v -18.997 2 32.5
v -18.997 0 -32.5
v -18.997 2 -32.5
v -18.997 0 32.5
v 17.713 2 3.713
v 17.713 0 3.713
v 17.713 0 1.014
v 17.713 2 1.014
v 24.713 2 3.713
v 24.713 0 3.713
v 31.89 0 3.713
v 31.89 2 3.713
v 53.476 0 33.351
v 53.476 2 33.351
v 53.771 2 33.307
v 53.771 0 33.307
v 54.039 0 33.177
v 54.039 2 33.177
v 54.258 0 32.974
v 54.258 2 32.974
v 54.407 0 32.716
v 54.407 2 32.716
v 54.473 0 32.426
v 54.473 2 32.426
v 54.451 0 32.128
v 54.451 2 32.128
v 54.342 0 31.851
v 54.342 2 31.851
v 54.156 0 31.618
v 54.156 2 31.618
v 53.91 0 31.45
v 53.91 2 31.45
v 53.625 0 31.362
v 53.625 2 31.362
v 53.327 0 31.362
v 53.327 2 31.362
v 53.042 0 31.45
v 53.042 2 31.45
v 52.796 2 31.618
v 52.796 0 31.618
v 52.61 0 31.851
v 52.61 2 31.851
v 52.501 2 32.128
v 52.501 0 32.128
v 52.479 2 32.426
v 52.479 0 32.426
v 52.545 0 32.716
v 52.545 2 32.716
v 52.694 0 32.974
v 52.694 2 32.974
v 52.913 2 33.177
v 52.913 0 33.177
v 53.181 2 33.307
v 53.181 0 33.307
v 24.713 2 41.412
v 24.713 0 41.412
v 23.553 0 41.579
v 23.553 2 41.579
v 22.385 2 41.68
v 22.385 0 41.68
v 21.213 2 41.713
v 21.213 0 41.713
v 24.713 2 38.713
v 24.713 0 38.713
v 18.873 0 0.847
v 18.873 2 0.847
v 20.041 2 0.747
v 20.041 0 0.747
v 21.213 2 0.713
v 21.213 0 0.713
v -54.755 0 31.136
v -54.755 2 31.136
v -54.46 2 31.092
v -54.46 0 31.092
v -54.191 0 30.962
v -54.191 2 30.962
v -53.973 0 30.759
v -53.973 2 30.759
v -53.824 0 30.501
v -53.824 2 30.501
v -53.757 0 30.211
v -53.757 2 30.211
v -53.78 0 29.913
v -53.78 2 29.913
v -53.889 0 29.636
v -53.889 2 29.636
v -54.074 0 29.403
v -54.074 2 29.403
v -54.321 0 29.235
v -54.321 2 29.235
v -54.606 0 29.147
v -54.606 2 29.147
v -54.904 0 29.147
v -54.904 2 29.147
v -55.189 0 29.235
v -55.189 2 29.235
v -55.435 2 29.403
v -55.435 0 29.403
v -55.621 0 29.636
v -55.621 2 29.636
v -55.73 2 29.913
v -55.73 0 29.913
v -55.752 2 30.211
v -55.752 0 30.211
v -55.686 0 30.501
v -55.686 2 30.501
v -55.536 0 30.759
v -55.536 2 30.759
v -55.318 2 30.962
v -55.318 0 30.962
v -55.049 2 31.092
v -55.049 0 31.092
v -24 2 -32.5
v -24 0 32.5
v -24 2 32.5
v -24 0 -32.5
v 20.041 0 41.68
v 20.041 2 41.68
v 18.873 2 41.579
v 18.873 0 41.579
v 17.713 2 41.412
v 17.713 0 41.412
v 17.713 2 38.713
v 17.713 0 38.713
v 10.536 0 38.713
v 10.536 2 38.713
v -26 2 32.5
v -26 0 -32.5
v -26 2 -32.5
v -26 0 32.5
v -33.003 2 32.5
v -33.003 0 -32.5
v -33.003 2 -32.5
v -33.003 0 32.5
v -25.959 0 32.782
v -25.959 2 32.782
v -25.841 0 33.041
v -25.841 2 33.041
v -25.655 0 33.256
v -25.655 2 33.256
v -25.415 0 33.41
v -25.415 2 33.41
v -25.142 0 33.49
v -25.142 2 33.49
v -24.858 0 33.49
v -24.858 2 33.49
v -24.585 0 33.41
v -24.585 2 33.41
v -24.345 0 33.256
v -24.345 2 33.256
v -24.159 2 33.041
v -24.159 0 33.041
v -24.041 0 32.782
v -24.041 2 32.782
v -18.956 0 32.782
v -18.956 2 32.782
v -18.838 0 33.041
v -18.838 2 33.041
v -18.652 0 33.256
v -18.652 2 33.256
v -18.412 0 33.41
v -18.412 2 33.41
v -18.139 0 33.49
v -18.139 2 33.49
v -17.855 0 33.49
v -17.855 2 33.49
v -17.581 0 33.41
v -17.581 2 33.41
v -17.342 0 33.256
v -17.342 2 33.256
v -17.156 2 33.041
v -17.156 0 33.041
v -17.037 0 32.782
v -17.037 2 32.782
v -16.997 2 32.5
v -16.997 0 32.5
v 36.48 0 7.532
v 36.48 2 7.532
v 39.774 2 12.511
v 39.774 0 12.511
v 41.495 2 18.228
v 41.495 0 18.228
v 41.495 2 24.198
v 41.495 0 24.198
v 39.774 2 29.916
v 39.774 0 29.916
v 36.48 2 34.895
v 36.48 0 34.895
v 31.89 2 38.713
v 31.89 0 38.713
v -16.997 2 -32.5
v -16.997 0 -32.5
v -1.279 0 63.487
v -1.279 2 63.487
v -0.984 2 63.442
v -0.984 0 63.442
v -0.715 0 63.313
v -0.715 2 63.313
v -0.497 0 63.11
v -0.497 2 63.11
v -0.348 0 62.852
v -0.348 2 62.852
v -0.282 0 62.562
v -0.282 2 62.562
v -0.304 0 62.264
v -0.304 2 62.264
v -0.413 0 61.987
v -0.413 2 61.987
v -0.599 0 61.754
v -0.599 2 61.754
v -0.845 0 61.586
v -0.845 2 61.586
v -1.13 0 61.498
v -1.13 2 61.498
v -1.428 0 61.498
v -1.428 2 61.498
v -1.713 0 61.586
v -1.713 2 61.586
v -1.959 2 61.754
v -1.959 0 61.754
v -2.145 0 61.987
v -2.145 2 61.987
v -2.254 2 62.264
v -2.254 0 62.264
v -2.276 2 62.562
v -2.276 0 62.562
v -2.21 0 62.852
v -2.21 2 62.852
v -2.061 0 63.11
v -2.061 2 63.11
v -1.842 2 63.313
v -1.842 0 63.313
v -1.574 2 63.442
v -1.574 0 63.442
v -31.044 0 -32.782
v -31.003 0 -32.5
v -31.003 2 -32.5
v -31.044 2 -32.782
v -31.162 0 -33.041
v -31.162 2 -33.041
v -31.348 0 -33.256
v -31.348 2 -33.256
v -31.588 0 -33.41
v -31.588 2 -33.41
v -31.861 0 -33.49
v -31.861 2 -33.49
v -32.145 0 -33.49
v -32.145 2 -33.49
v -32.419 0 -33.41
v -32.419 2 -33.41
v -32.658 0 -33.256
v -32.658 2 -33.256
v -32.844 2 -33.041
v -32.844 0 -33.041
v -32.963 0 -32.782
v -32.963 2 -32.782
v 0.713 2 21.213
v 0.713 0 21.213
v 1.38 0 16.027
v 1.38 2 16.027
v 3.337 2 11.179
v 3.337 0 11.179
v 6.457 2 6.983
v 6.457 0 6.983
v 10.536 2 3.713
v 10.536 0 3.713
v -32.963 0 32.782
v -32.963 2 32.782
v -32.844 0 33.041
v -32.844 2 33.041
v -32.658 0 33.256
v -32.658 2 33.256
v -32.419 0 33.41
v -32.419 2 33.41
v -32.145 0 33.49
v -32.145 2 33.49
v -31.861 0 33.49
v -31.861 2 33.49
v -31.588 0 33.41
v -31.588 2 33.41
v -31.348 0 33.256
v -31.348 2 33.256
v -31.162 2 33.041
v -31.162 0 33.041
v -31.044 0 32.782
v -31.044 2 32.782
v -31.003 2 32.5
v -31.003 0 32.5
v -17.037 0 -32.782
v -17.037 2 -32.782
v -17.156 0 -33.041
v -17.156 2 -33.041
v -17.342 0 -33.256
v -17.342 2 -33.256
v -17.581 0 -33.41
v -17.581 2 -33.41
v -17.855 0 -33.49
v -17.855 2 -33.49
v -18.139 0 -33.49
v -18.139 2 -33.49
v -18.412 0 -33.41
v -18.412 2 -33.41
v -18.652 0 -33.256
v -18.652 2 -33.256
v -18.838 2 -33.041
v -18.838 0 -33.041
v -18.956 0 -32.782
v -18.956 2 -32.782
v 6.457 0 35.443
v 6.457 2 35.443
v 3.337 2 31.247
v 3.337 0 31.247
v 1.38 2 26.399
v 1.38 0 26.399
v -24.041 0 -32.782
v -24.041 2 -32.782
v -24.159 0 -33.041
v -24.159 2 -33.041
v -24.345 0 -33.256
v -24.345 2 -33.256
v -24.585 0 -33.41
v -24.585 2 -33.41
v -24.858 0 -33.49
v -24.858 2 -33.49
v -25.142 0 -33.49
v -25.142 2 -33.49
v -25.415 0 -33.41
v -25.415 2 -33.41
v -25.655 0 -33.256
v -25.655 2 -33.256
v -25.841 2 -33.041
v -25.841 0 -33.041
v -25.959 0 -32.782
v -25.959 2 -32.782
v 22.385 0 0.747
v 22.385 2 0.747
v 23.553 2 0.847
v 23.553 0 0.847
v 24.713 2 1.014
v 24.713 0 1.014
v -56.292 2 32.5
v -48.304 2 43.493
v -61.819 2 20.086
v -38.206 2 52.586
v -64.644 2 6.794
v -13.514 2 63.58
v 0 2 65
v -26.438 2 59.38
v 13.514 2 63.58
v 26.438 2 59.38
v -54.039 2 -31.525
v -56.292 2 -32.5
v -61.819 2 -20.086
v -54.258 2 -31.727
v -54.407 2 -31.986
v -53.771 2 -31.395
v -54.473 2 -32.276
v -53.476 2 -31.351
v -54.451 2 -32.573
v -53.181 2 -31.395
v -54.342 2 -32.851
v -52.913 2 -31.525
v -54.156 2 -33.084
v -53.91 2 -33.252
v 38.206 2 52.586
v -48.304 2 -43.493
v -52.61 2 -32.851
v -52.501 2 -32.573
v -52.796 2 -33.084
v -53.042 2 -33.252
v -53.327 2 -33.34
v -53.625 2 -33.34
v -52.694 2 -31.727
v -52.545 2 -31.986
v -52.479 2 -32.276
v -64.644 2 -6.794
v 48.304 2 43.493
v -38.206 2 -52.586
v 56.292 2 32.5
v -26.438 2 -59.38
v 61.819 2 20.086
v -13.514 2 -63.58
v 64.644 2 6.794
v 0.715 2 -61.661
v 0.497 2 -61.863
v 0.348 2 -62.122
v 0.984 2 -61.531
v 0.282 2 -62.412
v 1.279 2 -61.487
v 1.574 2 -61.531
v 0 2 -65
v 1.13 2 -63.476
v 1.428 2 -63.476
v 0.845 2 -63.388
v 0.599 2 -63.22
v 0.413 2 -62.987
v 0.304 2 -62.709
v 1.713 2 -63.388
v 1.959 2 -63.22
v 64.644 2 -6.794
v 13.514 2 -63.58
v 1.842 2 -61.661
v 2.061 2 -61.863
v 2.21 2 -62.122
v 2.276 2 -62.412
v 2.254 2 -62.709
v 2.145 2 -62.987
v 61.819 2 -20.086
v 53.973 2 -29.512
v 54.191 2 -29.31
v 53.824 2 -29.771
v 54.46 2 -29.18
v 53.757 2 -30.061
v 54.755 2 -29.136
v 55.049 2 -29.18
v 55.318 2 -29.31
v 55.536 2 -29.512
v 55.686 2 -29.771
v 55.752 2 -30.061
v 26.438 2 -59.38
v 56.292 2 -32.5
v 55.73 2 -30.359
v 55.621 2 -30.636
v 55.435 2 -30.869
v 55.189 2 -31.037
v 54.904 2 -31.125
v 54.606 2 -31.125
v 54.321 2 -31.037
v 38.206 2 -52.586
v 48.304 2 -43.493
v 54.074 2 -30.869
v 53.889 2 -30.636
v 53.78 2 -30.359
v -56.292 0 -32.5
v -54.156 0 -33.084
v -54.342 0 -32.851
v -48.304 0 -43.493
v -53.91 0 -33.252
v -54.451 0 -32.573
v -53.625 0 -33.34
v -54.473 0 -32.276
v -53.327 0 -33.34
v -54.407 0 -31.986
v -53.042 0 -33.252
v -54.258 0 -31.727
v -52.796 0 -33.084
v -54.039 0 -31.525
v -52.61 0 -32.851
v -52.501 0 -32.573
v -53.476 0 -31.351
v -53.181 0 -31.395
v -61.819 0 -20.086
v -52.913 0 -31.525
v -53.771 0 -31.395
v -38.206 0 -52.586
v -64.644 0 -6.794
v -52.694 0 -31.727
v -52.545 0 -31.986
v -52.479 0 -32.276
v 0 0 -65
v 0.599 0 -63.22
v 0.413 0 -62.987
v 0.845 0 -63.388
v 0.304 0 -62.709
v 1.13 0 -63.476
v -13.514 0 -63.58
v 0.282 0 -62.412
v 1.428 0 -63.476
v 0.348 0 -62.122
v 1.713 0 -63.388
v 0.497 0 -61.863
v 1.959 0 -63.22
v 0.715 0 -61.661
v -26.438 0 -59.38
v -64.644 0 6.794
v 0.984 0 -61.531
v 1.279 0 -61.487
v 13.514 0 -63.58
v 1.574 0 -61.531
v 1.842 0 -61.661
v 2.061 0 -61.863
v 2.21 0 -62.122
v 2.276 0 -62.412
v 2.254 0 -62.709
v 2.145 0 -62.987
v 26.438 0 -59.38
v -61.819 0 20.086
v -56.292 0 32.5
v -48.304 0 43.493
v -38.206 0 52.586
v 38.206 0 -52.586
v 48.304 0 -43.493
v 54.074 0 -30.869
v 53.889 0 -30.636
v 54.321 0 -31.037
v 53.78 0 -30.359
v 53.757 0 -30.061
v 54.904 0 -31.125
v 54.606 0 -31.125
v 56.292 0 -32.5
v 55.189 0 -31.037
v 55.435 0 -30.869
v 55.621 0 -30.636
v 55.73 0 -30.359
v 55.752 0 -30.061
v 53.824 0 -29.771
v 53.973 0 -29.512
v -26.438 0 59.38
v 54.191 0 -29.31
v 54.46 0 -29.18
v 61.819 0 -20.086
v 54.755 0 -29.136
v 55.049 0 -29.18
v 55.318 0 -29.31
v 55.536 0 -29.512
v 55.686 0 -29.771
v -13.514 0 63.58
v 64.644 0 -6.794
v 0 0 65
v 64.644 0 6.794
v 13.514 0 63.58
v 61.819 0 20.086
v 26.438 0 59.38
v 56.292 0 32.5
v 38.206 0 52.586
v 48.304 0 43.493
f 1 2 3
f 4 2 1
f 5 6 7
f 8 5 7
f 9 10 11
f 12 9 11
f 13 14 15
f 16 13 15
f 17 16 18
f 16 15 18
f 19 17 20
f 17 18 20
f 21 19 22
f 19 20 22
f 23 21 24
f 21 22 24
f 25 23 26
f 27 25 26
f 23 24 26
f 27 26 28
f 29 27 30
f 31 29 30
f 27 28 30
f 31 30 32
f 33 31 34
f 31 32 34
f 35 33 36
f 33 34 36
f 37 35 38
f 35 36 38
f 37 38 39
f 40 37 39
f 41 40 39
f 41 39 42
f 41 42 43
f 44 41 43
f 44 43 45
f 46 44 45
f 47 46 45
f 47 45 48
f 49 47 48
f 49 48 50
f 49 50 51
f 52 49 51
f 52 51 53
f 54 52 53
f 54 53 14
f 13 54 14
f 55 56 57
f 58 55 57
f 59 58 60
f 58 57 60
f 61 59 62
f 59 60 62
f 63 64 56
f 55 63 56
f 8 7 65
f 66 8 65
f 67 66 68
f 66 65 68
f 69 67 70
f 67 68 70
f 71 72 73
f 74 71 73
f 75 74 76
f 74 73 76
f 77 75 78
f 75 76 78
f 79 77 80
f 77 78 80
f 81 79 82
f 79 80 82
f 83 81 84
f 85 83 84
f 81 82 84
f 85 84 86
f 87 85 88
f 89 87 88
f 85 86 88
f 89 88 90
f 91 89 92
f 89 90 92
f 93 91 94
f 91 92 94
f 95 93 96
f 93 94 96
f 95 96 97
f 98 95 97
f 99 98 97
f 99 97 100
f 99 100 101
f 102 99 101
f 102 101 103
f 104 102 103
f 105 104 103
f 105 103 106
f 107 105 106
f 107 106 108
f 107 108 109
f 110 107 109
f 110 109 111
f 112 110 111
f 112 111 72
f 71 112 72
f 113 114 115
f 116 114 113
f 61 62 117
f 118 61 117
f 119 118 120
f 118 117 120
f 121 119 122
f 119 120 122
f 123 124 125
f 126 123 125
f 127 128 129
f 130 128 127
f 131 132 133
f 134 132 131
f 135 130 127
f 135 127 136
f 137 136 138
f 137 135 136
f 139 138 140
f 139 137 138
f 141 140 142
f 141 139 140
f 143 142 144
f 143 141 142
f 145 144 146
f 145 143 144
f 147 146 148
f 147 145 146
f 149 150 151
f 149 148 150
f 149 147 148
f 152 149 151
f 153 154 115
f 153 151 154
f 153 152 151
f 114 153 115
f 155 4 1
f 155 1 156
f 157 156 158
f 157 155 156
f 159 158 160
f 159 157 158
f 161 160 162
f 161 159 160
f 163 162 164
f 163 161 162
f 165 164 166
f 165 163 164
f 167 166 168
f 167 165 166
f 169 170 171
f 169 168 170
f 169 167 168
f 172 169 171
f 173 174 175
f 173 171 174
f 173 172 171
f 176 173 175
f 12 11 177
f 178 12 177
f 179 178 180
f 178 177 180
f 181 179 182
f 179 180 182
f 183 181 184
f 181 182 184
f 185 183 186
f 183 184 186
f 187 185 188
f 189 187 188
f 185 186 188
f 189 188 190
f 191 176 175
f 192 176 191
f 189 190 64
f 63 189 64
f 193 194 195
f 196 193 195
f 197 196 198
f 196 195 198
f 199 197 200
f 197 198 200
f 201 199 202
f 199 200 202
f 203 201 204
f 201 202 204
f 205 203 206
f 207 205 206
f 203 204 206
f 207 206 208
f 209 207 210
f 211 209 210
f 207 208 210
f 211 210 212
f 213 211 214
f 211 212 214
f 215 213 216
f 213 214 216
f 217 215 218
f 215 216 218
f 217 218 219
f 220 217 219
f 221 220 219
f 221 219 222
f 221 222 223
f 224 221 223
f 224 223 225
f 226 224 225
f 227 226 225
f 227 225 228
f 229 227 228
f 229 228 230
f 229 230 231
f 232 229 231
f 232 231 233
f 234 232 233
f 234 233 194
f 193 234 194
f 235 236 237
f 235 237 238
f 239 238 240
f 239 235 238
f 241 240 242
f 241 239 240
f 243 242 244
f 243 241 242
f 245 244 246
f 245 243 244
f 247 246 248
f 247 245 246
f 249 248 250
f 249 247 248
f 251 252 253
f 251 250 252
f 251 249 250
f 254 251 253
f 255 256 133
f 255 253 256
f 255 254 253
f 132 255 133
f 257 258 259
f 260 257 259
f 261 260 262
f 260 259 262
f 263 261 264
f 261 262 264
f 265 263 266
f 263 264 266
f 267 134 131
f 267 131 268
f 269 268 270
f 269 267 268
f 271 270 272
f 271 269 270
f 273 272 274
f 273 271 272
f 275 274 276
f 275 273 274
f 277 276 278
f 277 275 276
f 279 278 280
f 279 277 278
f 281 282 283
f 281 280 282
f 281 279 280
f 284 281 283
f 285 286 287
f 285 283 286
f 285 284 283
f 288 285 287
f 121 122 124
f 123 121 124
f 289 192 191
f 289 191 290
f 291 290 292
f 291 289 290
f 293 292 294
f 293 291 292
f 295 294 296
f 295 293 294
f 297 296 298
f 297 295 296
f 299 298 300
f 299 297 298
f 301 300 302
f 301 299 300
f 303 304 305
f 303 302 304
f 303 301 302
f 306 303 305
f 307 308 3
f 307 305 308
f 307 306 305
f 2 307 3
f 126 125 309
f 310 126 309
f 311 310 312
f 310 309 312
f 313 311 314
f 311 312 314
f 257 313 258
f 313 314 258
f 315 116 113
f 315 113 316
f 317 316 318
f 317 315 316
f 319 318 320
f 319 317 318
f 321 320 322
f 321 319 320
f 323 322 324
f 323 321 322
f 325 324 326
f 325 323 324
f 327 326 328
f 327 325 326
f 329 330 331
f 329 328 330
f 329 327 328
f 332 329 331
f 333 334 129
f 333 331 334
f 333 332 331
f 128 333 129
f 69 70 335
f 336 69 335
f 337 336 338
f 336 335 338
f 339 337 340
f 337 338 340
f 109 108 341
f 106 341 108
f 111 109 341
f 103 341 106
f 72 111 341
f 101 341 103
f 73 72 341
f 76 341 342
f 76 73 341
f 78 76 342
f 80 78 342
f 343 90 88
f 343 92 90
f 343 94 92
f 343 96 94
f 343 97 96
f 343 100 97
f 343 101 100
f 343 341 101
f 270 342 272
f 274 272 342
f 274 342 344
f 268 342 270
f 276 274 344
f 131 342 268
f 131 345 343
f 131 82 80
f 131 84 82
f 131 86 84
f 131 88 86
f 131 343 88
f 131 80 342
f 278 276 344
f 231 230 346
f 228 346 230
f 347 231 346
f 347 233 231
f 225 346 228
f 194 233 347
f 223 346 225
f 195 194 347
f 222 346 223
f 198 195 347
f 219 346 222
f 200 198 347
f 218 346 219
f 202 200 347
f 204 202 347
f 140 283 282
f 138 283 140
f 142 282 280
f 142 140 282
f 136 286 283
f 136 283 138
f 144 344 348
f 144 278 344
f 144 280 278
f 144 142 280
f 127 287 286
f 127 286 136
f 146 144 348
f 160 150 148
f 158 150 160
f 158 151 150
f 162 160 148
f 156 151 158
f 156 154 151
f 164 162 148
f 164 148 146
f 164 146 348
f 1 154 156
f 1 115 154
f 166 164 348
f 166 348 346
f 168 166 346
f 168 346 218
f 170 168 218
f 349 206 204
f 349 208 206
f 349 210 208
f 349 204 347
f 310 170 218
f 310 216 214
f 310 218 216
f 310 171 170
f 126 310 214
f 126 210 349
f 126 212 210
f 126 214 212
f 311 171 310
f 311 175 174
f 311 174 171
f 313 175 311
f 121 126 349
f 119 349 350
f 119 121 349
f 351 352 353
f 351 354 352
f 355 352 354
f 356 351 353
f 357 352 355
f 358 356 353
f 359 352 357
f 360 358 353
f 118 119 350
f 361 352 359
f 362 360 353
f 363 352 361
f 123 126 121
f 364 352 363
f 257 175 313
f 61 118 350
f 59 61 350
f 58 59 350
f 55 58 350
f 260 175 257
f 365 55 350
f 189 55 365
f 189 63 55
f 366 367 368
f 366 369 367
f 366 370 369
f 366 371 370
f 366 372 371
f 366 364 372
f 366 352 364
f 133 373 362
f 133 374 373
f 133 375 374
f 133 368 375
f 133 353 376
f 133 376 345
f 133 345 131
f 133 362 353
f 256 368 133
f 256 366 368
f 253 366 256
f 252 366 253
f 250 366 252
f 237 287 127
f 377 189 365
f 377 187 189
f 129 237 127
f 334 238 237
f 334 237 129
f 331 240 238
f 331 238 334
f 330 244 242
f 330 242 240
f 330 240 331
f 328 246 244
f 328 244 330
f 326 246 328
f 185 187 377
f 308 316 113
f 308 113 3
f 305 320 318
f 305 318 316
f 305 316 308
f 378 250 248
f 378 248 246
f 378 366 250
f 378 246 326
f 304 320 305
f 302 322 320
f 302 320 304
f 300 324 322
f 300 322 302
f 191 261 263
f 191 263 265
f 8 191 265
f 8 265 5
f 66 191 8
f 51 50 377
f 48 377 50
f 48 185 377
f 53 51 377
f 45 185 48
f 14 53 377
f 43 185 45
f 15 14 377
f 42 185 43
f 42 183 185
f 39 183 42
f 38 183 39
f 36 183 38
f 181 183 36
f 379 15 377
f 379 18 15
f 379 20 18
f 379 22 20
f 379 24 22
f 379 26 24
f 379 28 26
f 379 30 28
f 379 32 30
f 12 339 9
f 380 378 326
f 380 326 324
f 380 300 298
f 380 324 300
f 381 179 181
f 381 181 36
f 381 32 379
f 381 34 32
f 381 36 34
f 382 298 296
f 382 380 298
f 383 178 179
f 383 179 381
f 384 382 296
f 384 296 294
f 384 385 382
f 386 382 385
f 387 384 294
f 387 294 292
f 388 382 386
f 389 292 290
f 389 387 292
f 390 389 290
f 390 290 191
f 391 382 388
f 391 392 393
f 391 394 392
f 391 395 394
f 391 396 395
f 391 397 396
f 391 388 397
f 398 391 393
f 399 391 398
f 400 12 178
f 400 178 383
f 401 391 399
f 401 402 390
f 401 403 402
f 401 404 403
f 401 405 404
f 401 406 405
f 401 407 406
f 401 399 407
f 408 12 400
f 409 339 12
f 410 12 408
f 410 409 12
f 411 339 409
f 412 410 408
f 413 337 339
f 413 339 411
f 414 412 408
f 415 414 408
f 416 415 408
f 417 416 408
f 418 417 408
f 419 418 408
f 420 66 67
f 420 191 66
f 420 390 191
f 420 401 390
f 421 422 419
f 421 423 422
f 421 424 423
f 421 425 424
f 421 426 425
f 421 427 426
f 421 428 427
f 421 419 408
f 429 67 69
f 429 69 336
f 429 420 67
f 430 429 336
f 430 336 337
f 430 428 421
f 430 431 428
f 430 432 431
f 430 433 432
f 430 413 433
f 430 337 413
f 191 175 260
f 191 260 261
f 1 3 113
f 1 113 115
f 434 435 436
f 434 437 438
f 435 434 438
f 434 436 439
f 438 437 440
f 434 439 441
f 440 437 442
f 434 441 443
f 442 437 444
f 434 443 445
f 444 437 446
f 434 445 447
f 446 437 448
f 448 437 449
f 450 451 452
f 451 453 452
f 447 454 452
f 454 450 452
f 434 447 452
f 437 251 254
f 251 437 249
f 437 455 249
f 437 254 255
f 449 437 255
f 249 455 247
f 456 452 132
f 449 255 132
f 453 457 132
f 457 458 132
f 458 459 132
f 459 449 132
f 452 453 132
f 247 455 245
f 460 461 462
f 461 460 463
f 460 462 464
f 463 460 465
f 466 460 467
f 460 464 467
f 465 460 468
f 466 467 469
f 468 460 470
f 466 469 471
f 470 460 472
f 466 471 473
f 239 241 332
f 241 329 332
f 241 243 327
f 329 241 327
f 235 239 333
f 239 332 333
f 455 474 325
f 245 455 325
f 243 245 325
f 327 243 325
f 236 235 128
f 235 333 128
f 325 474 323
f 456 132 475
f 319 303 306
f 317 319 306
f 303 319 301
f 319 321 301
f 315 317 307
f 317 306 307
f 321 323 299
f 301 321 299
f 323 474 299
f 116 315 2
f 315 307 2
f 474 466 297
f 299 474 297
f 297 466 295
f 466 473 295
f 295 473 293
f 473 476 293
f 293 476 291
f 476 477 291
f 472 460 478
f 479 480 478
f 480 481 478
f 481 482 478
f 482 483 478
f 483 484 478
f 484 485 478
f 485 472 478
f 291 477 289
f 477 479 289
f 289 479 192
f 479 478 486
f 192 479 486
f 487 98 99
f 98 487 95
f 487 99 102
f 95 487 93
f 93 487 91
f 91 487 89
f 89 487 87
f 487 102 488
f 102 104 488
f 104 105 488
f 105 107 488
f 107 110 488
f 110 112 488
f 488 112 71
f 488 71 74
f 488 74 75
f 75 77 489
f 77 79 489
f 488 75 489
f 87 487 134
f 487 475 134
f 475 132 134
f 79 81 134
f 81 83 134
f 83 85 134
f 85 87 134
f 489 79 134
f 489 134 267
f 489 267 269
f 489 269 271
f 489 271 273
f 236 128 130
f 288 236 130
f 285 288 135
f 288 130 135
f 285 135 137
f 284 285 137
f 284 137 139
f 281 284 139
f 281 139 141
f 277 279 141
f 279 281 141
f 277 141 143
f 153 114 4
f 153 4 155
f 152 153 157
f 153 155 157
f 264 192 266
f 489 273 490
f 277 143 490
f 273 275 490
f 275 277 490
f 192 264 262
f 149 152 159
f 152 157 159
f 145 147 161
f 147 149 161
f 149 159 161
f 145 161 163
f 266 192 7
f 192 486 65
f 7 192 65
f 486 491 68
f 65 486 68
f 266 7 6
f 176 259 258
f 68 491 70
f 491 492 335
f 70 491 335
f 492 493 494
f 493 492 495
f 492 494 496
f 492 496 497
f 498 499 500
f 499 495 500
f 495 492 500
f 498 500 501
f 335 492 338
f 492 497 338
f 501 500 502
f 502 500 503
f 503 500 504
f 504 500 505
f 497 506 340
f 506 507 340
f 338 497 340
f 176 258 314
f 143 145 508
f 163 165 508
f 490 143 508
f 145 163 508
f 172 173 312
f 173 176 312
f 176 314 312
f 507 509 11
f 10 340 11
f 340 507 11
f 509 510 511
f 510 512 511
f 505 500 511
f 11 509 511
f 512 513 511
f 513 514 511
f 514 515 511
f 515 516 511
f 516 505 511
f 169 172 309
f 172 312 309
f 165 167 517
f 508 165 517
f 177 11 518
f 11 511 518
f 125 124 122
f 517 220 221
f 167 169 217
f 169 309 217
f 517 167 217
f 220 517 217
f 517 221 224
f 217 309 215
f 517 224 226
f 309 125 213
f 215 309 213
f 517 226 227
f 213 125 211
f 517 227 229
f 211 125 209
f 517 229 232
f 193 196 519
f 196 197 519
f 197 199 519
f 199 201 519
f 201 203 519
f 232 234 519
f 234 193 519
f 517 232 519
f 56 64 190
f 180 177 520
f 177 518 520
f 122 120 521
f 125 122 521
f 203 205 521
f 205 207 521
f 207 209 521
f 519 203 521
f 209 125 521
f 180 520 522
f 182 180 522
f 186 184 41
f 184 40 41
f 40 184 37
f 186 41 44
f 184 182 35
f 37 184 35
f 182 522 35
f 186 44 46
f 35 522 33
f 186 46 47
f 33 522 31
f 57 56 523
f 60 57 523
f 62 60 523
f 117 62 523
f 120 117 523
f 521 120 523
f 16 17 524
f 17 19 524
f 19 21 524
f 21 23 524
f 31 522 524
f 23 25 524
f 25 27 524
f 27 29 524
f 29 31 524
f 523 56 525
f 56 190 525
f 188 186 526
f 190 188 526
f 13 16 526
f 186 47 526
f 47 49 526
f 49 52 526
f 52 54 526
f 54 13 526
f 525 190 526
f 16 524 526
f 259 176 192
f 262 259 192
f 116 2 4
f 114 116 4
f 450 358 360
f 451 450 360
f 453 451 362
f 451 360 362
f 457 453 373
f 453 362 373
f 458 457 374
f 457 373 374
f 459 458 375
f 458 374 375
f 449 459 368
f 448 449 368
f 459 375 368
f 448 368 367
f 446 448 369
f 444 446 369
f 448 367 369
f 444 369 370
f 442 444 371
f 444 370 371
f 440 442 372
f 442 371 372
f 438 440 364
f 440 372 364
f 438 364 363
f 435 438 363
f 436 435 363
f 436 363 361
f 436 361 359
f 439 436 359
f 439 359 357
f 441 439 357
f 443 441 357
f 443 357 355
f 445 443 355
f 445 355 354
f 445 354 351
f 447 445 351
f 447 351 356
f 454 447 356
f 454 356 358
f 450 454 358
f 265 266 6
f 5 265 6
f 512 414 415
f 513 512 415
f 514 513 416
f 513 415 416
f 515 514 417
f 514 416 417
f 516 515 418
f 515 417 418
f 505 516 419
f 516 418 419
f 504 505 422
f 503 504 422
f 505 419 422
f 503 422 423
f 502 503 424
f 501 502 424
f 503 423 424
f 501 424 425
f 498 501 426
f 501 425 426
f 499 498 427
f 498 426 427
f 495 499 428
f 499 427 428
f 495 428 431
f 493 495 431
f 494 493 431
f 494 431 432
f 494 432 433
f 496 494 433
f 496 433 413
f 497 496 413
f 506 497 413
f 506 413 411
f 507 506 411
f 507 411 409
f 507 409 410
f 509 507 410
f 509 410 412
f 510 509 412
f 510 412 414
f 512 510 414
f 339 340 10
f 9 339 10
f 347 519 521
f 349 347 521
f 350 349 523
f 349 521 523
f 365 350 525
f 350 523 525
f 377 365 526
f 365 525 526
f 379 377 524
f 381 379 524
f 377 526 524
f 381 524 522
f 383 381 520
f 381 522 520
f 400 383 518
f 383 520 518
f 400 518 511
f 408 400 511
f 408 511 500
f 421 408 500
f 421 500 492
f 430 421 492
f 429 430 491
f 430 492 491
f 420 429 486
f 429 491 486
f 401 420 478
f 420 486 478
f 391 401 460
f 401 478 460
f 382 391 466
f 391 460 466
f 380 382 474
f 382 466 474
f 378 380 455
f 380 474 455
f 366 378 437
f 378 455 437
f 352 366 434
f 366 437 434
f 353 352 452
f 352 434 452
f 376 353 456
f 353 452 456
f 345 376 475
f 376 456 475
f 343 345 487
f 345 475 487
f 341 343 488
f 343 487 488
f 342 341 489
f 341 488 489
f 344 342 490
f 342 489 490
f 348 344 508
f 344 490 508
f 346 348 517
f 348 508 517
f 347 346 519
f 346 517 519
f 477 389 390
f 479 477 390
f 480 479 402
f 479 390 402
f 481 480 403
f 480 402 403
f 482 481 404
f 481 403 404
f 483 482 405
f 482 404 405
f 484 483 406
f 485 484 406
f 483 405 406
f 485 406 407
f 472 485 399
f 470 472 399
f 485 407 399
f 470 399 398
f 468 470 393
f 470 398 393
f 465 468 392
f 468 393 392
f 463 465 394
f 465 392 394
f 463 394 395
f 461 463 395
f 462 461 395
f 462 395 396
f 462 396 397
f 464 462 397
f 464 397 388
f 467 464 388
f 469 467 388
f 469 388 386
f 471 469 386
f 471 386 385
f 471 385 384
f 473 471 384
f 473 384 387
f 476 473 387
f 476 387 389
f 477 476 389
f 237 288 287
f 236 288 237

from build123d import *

# Parameters (mm, degrees)
ESQUISSE1_R              = 65
BOSS_EXTRU_1_DEPTH       = 2
ESQUISSE2_R              = 1
ENL_V_MAT_EXTRU_1_DEPTH  = 3
ESQUISSE3_R              = 7.5
ENL_V_MAT_EXTRU_2_DEPTH  = 3
ESQUISSE4_R              = 2
ENL_V_MAT_EXTRU_4_DEPTH  = 4
ESQUISSE5_R              = 7.5
BOSS_EXTRU_3_DEPTH       = 4
ESQUISSE6_R              = 2
BOSS_EXTRU_5_DEPTH       = 2
ENL_V_START              = -2
ESQUISSE11_R             = 7.5
ENL_V_MAT_EXTRU_7_DEPTH  = 2
ENL_V_MAT_EXTRU_10_DEPTH = 92.945636112
ENL_V_MAT_EXTRU_11_DEPTH = 10


with BuildPart() as part:
    # Esquisse1 → Boss.-Extru.1 (new body)
    with BuildSketch(Plane(origin=(0, 0, 0), x_dir=(1, 0, 0), z_dir=(0, 1, 0))):
        with Locations(Location((0, 0, 0), (0, 0, 270))):
            Circle(ESQUISSE1_R)
    extrude(amount=BOSS_EXTRU_1_DEPTH)

    # Esquisse2 → Enlèv. mat.-Extru.1 (cut)
    with BuildSketch(Plane(origin=(0, 2, 0), x_dir=(1, 0, 0), z_dir=(0, 1, 0))):
        with Locations(Location((-53.47585562, 32.350932996, 0), (0, 0, 270))):
            Circle(ESQUISSE2_R)
        with Locations(Location((-54.754657621, -30.135982958, 0), (0, 0, 270))):
            Circle(ESQUISSE2_R)
        with Locations(Location((-1.278802001, -62.486915954, 0), (0, 0, 270))):
            Circle(ESQUISSE2_R)
        with Locations(Location((53.47585562, -32.350932996, 0), (0, 0, 270))):
            Circle(ESQUISSE2_R)
        with Locations(Location((54.754657621, 30.135982958, 0), (0, 0, 270))):
            Circle(ESQUISSE2_R)
        with Locations(Location((1.278802001, 62.486915954, 0), (0, 0, 270))):
            Circle(ESQUISSE2_R)
    extrude(amount=-ENL_V_MAT_EXTRU_1_DEPTH, mode=Mode.SUBTRACT)

    # Esquisse3 → Enlèv. mat.-Extru.2 (cut)
    with BuildSketch(Plane(origin=(0, 2, 0), x_dir=(1, 0, 0), z_dir=(0, 1, 0))):
        with Locations(Location((0, 0, 0), (0, 0, 270))):
            Circle(ESQUISSE3_R)
    extrude(amount=-ENL_V_MAT_EXTRU_2_DEPTH, mode=Mode.SUBTRACT)

    # Esquisse4 → Enlèv. mat.-Extru.4 (cut)
    with BuildSketch(Plane(origin=(0, 2, 0), x_dir=(1, 0, 0), z_dir=(0, 1, 0))):
        with Locations(Location((0, 33.5, 0), (0, 0, 270))):
            Circle(ESQUISSE4_R)
        with Locations(Location((29.011851027, 16.75, 0), (0, 0, 270))):
            Circle(ESQUISSE4_R)
        with Locations(Location((29.011851027, -16.75, 0), (0, 0, 270))):
            Circle(ESQUISSE4_R)
        with Locations(Location((0, -33.5, 0), (0, 0, 270))):
            Circle(ESQUISSE4_R)
        with Locations(Location((-29.011851027, -16.75, 0), (0, 0, 270))):
            Circle(ESQUISSE4_R)
        with Locations(Location((-29.011851027, 16.75, 0), (0, 0, 270))):
            Circle(ESQUISSE4_R)
    extrude(amount=-ENL_V_MAT_EXTRU_4_DEPTH, mode=Mode.SUBTRACT)

    # Esquisse5 → Boss.-Extru.3 (add)
    with BuildSketch(Plane(origin=(0, 2, 0), x_dir=(1, 0, 0), z_dir=(0, 1, 0))):
        with Locations(Location((0, 0, 0), (0, 0, 270))):
            Circle(ESQUISSE5_R)
    extrude(amount=-BOSS_EXTRU_3_DEPTH)

    # Esquisse6 → Boss.-Extru.5 (add)
    with BuildSketch(Plane(origin=(0, 2, 0), x_dir=(1, 0, 0), z_dir=(0, 1, 0))):
        with Locations((-29.011851027, 16.75)):
            Circle(ESQUISSE6_R)
        with Locations((29.011851027, 16.75)):
            Circle(ESQUISSE6_R)
        with Locations((29.011851027, -16.75)):
            Circle(ESQUISSE6_R)
        with Locations((0, -33.5)):
            Circle(ESQUISSE6_R)
        with Locations((-29.011851027, -16.75)):
            Circle(ESQUISSE6_R)
        with Locations((0, 33.5)):
            Circle(ESQUISSE6_R)
    extrude(amount=-BOSS_EXTRU_5_DEPTH)

    # Esquisse11 → Enlèv. mat.-Extru.7 (cut)
    with BuildSketch(Plane(origin=(0, -2, 0), x_dir=(-1, 0, 0), z_dir=(0, -1, 0)).offset(ENL_V_START)):
        Circle(ESQUISSE11_R)
    extrude(amount=ENL_V_MAT_EXTRU_7_DEPTH, mode=Mode.SUBTRACT)

    # Esquisse13 → Enlèv. mat.-Extru.10 (cut, through all)
    with BuildSketch(Plane(origin=(0, 0, 0), x_dir=(-1, 0, 0), z_dir=(0, -1, 0))):
        with BuildLine():
            Line((-17.713203436, -3.713203436), (-21.213203436, -3.713203436))
            Line((-21.213203436, -3.713203436), (-21.213203436, -38.713203436))
            Line((-21.213203436, -38.713203436), (-17.713203436, -38.713203436))
            Line((-17.713203436, -38.713203436), (-10.536125184, -38.713203436))
            ThreePointArc((-10.536125184, -38.713203436), (-3.336820913, -31.247392387), (-0.713203436, -21.213203436))
            ThreePointArc((-0.713203436, -21.213203436), (-3.336820913, -11.179014484), (-10.536125184, -3.713203436))
            Line((-10.536125184, -3.713203436), (-17.713203436, -3.713203436))
        make_face()
        with BuildLine():
            Line((-21.213203436, -38.713203436), (-21.213203436, -3.713203436))
            Line((-21.213203436, -3.713203436), (-24.713203436, -3.713203436))
            Line((-24.713203436, -3.713203436), (-31.890281688, -3.713203436))
            ThreePointArc((-31.890281688, -3.713203436), (-41.713203436, -21.213203436), (-31.890281688, -38.713203436))
            Line((-31.890281688, -38.713203436), (-24.713203436, -38.713203436))
            Line((-24.713203436, -38.713203436), (-21.213203436, -38.713203436))
        make_face()
        with BuildLine():
            Line((-21.213203436, -3.713203436), (-21.213203436, -0.713203436))
            ThreePointArc((-21.213203436, -0.713203436), (-22.969662591, -0.788589578), (-24.713203436, -1.014193559))
            Line((-24.713203436, -1.014193559), (-24.713203436, -3.713203436))
            Line((-24.713203436, -3.713203436), (-21.213203436, -3.713203436))
        make_face()
        with BuildLine():
            ThreePointArc((-17.713203436, -1.014193559), (-19.45674428, -0.788589578), (-21.213203436, -0.713203436))
            Line((-21.213203436, -0.713203436), (-21.213203436, -3.713203436))
            Line((-21.213203436, -3.713203436), (-17.713203436, -3.713203436))
            Line((-17.713203436, -3.713203436), (-17.713203436, -1.014193559))
        make_face()
        with BuildLine():
            Line((-17.713203436, -38.713203436), (-21.213203436, -38.713203436))
            Line((-21.213203436, -38.713203436), (-21.213203436, -41.713203436))
            ThreePointArc((-21.213203436, -41.713203436), (-19.45674428, -41.637817293), (-17.713203436, -41.412213312))
            Line((-17.713203436, -41.412213312), (-17.713203436, -38.713203436))
        make_face()
        with BuildLine():
            Line((-21.213203436, -41.713203436), (-21.213203436, -38.713203436))
            Line((-21.213203436, -38.713203436), (-24.713203436, -38.713203436))
            Line((-24.713203436, -38.713203436), (-24.713203436, -41.412213312))
            ThreePointArc((-24.713203436, -41.412213312), (-22.969662591, -41.637817293), (-21.213203436, -41.713203436))
        make_face()
    extrude(amount=-ENL_V_MAT_EXTRU_10_DEPTH, mode=Mode.SUBTRACT)

    # Esquisse14 → Enlèv. mat.-Extru.11 (cut)
    with BuildSketch(Plane(origin=(0, 0, 0), x_dir=(-1, 0, 0), z_dir=(0, -1, 0))):
        with BuildLine():
            Line((24, -32.5), (24, 32.5))
            ThreePointArc((24, 32.5), (25, 33.5), (26, 32.5))
            Line((26, 32.5), (26, -32.5))
            ThreePointArc((26, -32.5), (25, -33.5), (24, -32.5))
        make_face()
        with BuildLine():
            Line((31.003124215, -32.5), (31.003124215, 32.5))
            ThreePointArc((31.003124215, 32.5), (32.003124215, 33.5), (33.003124215, 32.5))
            Line((33.003124215, 32.5), (33.003124215, -32.5))
            ThreePointArc((33.003124215, -32.5), (32.003124215, -33.5), (31.003124215, -32.5))
        make_face()
        with BuildLine():
            Line((16.996875785, -32.5), (16.996875785, 32.5))
            ThreePointArc((16.996875785, 32.5), (17.996875785, 33.5), (18.996875785, 32.5))
            Line((18.996875785, 32.5), (18.996875785, -32.5))
            ThreePointArc((18.996875785, -32.5), (17.996875785, -33.5), (16.996875785, -32.5))
        make_face()
    extrude(amount=-ENL_V_MAT_EXTRU_11_DEPTH, mode=Mode.SUBTRACT)


solid = part.part
